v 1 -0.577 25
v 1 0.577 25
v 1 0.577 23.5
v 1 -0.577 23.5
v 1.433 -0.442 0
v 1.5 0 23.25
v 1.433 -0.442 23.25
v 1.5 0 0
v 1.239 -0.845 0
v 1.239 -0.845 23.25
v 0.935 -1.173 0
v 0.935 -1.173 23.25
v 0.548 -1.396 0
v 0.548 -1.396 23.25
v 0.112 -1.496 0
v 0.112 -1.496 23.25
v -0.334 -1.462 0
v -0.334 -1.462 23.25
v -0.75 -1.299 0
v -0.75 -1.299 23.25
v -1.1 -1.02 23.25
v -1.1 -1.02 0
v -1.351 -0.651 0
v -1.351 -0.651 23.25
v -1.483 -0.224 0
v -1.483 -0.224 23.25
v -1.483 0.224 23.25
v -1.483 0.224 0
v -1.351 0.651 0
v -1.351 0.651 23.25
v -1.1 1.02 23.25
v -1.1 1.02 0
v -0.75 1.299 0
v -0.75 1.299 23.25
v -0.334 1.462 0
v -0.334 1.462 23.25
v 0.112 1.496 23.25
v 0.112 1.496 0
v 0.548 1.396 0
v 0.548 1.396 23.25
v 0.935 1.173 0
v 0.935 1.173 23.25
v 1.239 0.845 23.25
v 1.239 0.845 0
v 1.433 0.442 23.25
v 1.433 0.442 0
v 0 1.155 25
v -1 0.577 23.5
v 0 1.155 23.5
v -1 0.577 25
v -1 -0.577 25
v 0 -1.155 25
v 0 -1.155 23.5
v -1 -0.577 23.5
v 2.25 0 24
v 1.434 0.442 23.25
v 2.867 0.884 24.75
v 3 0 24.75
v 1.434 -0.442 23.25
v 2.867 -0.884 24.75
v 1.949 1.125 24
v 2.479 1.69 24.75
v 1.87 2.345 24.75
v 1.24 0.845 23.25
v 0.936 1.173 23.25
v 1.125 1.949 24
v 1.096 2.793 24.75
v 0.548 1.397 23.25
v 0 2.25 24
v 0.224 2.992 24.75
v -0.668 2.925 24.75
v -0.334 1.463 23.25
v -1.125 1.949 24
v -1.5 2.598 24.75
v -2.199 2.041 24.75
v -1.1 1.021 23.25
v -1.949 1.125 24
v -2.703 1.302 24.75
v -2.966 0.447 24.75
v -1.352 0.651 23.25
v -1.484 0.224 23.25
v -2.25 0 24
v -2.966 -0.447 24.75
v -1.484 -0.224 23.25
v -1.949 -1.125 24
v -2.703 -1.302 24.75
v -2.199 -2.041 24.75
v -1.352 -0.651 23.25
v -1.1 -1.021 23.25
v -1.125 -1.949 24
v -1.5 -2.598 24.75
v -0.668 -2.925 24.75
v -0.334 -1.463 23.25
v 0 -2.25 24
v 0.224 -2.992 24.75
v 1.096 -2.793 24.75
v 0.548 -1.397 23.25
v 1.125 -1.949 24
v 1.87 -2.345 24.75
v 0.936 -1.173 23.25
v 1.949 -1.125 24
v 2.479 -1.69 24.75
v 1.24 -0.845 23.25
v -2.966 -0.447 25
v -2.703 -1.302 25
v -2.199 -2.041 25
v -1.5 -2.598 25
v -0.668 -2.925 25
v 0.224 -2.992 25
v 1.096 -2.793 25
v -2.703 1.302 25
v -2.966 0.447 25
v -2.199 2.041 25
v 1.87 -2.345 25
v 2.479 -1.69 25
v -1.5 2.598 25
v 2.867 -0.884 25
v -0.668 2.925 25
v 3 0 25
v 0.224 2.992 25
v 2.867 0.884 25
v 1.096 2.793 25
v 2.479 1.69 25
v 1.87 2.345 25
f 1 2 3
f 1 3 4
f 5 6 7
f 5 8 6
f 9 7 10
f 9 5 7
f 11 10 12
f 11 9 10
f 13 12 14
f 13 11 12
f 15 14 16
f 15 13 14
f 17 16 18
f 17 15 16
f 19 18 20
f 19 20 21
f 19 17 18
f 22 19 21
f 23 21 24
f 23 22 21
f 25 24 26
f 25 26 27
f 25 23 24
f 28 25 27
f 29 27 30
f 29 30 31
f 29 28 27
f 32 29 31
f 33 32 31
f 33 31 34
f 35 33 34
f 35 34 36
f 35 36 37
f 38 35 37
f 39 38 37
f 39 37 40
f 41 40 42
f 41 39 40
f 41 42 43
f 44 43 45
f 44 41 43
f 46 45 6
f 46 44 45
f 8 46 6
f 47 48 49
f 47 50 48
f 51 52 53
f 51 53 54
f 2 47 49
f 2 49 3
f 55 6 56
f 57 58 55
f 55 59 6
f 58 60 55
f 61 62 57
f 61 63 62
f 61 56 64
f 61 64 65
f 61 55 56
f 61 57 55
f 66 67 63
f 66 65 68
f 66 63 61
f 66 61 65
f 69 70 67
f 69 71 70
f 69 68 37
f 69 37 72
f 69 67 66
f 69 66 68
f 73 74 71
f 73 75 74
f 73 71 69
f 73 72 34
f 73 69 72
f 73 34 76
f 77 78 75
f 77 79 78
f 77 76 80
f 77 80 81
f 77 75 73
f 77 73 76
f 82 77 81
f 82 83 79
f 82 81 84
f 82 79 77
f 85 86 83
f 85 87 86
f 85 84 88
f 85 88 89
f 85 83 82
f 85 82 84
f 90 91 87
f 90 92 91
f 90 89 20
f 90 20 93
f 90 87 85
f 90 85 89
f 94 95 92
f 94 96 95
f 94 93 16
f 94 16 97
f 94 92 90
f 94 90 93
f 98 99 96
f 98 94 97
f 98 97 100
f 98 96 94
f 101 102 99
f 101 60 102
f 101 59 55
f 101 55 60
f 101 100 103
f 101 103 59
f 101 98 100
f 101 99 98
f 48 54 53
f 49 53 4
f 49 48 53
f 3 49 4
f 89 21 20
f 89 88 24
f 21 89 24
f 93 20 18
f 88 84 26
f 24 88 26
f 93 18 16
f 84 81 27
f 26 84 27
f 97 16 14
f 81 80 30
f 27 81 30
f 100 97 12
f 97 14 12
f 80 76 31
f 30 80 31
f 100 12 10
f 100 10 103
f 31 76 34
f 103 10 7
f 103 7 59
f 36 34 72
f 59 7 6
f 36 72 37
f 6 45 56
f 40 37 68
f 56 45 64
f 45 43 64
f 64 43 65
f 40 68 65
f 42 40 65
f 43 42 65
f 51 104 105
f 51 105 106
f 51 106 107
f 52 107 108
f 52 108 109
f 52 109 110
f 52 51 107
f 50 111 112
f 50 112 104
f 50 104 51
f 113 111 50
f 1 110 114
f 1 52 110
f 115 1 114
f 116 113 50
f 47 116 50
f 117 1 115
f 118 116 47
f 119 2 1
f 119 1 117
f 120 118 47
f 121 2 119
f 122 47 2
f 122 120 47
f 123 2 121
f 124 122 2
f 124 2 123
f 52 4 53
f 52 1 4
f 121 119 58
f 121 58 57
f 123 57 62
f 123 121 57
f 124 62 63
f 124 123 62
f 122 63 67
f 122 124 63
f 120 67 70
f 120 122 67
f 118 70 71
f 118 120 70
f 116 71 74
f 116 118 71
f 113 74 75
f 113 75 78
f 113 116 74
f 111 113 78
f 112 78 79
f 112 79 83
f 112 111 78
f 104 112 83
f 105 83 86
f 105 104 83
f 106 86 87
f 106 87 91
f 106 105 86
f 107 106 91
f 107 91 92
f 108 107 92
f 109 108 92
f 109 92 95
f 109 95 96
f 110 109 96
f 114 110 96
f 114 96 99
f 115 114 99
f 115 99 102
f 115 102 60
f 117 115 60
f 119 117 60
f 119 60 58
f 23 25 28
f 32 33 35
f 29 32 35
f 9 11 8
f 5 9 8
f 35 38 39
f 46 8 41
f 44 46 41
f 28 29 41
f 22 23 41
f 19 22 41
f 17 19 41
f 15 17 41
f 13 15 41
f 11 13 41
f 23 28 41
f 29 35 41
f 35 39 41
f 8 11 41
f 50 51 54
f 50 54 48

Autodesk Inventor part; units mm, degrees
ref_plane "YZ Plane" through (0, 0, 0) normal (1, 0, 0) x (0, 1, 0)
ref_plane "XZ Plane" through (0, 0, 0) normal (0, 1, 0) x (-1, 0, 0)
ref_plane "XY Plane" through (0, 0, 0) normal (0, 0, 1) x (1, 0, 0)
sketch "スケッチ1" plane through (0, 0, 0) normal (0, 0, 1) x (1, 0, 0)
  circle A0 centre (0, 0) radius 1.5
  dimension "d0" = 3
extrude "押し出し1" add sketch "スケッチ1" along normal blind 25
thread "ねじ1" size "M3x0.5" class "6g" standard "ANSI Metric M Profile" full length
sketch "スケッチ2" plane through (0, 0, 25) normal (0, 0, 1) x (1, 0, 0)
  circle A0 centre (0, 0) radius 3
  dimension "d5" = 6
extrude "押し出し2" add sketch "スケッチ2" against normal blind 1.75
chamfer "面取り1" distance 1.5 angle 45 1 edges at (-3, 0, 23.25)
sketch "スケッチ3" plane through (0, 0, 25) normal (0, 0, 1) x (1, 0, 0)
  line L0 (0, 1.1547) -> (1, 0.5774)
  line L1 (1, 0.5774) -> (1, -0.5774)
  line L2 (1, -0.5774) -> (0, -1.1547)
  line L3 (0, -1.1547) -> (-1, -0.5774)
  line L4 (-1, -0.5774) -> (-1, 0.5774)
  line L5 (-1, 0.5774) -> (0, 1.1547)
  point P0 (0, 0)
  point P1 (0, 0)
  dimension "d11" = 2
extrude "押し出し3" cut sketch "スケッチ3" against normal blind 1.5
properties part number "m3皿ネジ15" material "鉄 灰色"
